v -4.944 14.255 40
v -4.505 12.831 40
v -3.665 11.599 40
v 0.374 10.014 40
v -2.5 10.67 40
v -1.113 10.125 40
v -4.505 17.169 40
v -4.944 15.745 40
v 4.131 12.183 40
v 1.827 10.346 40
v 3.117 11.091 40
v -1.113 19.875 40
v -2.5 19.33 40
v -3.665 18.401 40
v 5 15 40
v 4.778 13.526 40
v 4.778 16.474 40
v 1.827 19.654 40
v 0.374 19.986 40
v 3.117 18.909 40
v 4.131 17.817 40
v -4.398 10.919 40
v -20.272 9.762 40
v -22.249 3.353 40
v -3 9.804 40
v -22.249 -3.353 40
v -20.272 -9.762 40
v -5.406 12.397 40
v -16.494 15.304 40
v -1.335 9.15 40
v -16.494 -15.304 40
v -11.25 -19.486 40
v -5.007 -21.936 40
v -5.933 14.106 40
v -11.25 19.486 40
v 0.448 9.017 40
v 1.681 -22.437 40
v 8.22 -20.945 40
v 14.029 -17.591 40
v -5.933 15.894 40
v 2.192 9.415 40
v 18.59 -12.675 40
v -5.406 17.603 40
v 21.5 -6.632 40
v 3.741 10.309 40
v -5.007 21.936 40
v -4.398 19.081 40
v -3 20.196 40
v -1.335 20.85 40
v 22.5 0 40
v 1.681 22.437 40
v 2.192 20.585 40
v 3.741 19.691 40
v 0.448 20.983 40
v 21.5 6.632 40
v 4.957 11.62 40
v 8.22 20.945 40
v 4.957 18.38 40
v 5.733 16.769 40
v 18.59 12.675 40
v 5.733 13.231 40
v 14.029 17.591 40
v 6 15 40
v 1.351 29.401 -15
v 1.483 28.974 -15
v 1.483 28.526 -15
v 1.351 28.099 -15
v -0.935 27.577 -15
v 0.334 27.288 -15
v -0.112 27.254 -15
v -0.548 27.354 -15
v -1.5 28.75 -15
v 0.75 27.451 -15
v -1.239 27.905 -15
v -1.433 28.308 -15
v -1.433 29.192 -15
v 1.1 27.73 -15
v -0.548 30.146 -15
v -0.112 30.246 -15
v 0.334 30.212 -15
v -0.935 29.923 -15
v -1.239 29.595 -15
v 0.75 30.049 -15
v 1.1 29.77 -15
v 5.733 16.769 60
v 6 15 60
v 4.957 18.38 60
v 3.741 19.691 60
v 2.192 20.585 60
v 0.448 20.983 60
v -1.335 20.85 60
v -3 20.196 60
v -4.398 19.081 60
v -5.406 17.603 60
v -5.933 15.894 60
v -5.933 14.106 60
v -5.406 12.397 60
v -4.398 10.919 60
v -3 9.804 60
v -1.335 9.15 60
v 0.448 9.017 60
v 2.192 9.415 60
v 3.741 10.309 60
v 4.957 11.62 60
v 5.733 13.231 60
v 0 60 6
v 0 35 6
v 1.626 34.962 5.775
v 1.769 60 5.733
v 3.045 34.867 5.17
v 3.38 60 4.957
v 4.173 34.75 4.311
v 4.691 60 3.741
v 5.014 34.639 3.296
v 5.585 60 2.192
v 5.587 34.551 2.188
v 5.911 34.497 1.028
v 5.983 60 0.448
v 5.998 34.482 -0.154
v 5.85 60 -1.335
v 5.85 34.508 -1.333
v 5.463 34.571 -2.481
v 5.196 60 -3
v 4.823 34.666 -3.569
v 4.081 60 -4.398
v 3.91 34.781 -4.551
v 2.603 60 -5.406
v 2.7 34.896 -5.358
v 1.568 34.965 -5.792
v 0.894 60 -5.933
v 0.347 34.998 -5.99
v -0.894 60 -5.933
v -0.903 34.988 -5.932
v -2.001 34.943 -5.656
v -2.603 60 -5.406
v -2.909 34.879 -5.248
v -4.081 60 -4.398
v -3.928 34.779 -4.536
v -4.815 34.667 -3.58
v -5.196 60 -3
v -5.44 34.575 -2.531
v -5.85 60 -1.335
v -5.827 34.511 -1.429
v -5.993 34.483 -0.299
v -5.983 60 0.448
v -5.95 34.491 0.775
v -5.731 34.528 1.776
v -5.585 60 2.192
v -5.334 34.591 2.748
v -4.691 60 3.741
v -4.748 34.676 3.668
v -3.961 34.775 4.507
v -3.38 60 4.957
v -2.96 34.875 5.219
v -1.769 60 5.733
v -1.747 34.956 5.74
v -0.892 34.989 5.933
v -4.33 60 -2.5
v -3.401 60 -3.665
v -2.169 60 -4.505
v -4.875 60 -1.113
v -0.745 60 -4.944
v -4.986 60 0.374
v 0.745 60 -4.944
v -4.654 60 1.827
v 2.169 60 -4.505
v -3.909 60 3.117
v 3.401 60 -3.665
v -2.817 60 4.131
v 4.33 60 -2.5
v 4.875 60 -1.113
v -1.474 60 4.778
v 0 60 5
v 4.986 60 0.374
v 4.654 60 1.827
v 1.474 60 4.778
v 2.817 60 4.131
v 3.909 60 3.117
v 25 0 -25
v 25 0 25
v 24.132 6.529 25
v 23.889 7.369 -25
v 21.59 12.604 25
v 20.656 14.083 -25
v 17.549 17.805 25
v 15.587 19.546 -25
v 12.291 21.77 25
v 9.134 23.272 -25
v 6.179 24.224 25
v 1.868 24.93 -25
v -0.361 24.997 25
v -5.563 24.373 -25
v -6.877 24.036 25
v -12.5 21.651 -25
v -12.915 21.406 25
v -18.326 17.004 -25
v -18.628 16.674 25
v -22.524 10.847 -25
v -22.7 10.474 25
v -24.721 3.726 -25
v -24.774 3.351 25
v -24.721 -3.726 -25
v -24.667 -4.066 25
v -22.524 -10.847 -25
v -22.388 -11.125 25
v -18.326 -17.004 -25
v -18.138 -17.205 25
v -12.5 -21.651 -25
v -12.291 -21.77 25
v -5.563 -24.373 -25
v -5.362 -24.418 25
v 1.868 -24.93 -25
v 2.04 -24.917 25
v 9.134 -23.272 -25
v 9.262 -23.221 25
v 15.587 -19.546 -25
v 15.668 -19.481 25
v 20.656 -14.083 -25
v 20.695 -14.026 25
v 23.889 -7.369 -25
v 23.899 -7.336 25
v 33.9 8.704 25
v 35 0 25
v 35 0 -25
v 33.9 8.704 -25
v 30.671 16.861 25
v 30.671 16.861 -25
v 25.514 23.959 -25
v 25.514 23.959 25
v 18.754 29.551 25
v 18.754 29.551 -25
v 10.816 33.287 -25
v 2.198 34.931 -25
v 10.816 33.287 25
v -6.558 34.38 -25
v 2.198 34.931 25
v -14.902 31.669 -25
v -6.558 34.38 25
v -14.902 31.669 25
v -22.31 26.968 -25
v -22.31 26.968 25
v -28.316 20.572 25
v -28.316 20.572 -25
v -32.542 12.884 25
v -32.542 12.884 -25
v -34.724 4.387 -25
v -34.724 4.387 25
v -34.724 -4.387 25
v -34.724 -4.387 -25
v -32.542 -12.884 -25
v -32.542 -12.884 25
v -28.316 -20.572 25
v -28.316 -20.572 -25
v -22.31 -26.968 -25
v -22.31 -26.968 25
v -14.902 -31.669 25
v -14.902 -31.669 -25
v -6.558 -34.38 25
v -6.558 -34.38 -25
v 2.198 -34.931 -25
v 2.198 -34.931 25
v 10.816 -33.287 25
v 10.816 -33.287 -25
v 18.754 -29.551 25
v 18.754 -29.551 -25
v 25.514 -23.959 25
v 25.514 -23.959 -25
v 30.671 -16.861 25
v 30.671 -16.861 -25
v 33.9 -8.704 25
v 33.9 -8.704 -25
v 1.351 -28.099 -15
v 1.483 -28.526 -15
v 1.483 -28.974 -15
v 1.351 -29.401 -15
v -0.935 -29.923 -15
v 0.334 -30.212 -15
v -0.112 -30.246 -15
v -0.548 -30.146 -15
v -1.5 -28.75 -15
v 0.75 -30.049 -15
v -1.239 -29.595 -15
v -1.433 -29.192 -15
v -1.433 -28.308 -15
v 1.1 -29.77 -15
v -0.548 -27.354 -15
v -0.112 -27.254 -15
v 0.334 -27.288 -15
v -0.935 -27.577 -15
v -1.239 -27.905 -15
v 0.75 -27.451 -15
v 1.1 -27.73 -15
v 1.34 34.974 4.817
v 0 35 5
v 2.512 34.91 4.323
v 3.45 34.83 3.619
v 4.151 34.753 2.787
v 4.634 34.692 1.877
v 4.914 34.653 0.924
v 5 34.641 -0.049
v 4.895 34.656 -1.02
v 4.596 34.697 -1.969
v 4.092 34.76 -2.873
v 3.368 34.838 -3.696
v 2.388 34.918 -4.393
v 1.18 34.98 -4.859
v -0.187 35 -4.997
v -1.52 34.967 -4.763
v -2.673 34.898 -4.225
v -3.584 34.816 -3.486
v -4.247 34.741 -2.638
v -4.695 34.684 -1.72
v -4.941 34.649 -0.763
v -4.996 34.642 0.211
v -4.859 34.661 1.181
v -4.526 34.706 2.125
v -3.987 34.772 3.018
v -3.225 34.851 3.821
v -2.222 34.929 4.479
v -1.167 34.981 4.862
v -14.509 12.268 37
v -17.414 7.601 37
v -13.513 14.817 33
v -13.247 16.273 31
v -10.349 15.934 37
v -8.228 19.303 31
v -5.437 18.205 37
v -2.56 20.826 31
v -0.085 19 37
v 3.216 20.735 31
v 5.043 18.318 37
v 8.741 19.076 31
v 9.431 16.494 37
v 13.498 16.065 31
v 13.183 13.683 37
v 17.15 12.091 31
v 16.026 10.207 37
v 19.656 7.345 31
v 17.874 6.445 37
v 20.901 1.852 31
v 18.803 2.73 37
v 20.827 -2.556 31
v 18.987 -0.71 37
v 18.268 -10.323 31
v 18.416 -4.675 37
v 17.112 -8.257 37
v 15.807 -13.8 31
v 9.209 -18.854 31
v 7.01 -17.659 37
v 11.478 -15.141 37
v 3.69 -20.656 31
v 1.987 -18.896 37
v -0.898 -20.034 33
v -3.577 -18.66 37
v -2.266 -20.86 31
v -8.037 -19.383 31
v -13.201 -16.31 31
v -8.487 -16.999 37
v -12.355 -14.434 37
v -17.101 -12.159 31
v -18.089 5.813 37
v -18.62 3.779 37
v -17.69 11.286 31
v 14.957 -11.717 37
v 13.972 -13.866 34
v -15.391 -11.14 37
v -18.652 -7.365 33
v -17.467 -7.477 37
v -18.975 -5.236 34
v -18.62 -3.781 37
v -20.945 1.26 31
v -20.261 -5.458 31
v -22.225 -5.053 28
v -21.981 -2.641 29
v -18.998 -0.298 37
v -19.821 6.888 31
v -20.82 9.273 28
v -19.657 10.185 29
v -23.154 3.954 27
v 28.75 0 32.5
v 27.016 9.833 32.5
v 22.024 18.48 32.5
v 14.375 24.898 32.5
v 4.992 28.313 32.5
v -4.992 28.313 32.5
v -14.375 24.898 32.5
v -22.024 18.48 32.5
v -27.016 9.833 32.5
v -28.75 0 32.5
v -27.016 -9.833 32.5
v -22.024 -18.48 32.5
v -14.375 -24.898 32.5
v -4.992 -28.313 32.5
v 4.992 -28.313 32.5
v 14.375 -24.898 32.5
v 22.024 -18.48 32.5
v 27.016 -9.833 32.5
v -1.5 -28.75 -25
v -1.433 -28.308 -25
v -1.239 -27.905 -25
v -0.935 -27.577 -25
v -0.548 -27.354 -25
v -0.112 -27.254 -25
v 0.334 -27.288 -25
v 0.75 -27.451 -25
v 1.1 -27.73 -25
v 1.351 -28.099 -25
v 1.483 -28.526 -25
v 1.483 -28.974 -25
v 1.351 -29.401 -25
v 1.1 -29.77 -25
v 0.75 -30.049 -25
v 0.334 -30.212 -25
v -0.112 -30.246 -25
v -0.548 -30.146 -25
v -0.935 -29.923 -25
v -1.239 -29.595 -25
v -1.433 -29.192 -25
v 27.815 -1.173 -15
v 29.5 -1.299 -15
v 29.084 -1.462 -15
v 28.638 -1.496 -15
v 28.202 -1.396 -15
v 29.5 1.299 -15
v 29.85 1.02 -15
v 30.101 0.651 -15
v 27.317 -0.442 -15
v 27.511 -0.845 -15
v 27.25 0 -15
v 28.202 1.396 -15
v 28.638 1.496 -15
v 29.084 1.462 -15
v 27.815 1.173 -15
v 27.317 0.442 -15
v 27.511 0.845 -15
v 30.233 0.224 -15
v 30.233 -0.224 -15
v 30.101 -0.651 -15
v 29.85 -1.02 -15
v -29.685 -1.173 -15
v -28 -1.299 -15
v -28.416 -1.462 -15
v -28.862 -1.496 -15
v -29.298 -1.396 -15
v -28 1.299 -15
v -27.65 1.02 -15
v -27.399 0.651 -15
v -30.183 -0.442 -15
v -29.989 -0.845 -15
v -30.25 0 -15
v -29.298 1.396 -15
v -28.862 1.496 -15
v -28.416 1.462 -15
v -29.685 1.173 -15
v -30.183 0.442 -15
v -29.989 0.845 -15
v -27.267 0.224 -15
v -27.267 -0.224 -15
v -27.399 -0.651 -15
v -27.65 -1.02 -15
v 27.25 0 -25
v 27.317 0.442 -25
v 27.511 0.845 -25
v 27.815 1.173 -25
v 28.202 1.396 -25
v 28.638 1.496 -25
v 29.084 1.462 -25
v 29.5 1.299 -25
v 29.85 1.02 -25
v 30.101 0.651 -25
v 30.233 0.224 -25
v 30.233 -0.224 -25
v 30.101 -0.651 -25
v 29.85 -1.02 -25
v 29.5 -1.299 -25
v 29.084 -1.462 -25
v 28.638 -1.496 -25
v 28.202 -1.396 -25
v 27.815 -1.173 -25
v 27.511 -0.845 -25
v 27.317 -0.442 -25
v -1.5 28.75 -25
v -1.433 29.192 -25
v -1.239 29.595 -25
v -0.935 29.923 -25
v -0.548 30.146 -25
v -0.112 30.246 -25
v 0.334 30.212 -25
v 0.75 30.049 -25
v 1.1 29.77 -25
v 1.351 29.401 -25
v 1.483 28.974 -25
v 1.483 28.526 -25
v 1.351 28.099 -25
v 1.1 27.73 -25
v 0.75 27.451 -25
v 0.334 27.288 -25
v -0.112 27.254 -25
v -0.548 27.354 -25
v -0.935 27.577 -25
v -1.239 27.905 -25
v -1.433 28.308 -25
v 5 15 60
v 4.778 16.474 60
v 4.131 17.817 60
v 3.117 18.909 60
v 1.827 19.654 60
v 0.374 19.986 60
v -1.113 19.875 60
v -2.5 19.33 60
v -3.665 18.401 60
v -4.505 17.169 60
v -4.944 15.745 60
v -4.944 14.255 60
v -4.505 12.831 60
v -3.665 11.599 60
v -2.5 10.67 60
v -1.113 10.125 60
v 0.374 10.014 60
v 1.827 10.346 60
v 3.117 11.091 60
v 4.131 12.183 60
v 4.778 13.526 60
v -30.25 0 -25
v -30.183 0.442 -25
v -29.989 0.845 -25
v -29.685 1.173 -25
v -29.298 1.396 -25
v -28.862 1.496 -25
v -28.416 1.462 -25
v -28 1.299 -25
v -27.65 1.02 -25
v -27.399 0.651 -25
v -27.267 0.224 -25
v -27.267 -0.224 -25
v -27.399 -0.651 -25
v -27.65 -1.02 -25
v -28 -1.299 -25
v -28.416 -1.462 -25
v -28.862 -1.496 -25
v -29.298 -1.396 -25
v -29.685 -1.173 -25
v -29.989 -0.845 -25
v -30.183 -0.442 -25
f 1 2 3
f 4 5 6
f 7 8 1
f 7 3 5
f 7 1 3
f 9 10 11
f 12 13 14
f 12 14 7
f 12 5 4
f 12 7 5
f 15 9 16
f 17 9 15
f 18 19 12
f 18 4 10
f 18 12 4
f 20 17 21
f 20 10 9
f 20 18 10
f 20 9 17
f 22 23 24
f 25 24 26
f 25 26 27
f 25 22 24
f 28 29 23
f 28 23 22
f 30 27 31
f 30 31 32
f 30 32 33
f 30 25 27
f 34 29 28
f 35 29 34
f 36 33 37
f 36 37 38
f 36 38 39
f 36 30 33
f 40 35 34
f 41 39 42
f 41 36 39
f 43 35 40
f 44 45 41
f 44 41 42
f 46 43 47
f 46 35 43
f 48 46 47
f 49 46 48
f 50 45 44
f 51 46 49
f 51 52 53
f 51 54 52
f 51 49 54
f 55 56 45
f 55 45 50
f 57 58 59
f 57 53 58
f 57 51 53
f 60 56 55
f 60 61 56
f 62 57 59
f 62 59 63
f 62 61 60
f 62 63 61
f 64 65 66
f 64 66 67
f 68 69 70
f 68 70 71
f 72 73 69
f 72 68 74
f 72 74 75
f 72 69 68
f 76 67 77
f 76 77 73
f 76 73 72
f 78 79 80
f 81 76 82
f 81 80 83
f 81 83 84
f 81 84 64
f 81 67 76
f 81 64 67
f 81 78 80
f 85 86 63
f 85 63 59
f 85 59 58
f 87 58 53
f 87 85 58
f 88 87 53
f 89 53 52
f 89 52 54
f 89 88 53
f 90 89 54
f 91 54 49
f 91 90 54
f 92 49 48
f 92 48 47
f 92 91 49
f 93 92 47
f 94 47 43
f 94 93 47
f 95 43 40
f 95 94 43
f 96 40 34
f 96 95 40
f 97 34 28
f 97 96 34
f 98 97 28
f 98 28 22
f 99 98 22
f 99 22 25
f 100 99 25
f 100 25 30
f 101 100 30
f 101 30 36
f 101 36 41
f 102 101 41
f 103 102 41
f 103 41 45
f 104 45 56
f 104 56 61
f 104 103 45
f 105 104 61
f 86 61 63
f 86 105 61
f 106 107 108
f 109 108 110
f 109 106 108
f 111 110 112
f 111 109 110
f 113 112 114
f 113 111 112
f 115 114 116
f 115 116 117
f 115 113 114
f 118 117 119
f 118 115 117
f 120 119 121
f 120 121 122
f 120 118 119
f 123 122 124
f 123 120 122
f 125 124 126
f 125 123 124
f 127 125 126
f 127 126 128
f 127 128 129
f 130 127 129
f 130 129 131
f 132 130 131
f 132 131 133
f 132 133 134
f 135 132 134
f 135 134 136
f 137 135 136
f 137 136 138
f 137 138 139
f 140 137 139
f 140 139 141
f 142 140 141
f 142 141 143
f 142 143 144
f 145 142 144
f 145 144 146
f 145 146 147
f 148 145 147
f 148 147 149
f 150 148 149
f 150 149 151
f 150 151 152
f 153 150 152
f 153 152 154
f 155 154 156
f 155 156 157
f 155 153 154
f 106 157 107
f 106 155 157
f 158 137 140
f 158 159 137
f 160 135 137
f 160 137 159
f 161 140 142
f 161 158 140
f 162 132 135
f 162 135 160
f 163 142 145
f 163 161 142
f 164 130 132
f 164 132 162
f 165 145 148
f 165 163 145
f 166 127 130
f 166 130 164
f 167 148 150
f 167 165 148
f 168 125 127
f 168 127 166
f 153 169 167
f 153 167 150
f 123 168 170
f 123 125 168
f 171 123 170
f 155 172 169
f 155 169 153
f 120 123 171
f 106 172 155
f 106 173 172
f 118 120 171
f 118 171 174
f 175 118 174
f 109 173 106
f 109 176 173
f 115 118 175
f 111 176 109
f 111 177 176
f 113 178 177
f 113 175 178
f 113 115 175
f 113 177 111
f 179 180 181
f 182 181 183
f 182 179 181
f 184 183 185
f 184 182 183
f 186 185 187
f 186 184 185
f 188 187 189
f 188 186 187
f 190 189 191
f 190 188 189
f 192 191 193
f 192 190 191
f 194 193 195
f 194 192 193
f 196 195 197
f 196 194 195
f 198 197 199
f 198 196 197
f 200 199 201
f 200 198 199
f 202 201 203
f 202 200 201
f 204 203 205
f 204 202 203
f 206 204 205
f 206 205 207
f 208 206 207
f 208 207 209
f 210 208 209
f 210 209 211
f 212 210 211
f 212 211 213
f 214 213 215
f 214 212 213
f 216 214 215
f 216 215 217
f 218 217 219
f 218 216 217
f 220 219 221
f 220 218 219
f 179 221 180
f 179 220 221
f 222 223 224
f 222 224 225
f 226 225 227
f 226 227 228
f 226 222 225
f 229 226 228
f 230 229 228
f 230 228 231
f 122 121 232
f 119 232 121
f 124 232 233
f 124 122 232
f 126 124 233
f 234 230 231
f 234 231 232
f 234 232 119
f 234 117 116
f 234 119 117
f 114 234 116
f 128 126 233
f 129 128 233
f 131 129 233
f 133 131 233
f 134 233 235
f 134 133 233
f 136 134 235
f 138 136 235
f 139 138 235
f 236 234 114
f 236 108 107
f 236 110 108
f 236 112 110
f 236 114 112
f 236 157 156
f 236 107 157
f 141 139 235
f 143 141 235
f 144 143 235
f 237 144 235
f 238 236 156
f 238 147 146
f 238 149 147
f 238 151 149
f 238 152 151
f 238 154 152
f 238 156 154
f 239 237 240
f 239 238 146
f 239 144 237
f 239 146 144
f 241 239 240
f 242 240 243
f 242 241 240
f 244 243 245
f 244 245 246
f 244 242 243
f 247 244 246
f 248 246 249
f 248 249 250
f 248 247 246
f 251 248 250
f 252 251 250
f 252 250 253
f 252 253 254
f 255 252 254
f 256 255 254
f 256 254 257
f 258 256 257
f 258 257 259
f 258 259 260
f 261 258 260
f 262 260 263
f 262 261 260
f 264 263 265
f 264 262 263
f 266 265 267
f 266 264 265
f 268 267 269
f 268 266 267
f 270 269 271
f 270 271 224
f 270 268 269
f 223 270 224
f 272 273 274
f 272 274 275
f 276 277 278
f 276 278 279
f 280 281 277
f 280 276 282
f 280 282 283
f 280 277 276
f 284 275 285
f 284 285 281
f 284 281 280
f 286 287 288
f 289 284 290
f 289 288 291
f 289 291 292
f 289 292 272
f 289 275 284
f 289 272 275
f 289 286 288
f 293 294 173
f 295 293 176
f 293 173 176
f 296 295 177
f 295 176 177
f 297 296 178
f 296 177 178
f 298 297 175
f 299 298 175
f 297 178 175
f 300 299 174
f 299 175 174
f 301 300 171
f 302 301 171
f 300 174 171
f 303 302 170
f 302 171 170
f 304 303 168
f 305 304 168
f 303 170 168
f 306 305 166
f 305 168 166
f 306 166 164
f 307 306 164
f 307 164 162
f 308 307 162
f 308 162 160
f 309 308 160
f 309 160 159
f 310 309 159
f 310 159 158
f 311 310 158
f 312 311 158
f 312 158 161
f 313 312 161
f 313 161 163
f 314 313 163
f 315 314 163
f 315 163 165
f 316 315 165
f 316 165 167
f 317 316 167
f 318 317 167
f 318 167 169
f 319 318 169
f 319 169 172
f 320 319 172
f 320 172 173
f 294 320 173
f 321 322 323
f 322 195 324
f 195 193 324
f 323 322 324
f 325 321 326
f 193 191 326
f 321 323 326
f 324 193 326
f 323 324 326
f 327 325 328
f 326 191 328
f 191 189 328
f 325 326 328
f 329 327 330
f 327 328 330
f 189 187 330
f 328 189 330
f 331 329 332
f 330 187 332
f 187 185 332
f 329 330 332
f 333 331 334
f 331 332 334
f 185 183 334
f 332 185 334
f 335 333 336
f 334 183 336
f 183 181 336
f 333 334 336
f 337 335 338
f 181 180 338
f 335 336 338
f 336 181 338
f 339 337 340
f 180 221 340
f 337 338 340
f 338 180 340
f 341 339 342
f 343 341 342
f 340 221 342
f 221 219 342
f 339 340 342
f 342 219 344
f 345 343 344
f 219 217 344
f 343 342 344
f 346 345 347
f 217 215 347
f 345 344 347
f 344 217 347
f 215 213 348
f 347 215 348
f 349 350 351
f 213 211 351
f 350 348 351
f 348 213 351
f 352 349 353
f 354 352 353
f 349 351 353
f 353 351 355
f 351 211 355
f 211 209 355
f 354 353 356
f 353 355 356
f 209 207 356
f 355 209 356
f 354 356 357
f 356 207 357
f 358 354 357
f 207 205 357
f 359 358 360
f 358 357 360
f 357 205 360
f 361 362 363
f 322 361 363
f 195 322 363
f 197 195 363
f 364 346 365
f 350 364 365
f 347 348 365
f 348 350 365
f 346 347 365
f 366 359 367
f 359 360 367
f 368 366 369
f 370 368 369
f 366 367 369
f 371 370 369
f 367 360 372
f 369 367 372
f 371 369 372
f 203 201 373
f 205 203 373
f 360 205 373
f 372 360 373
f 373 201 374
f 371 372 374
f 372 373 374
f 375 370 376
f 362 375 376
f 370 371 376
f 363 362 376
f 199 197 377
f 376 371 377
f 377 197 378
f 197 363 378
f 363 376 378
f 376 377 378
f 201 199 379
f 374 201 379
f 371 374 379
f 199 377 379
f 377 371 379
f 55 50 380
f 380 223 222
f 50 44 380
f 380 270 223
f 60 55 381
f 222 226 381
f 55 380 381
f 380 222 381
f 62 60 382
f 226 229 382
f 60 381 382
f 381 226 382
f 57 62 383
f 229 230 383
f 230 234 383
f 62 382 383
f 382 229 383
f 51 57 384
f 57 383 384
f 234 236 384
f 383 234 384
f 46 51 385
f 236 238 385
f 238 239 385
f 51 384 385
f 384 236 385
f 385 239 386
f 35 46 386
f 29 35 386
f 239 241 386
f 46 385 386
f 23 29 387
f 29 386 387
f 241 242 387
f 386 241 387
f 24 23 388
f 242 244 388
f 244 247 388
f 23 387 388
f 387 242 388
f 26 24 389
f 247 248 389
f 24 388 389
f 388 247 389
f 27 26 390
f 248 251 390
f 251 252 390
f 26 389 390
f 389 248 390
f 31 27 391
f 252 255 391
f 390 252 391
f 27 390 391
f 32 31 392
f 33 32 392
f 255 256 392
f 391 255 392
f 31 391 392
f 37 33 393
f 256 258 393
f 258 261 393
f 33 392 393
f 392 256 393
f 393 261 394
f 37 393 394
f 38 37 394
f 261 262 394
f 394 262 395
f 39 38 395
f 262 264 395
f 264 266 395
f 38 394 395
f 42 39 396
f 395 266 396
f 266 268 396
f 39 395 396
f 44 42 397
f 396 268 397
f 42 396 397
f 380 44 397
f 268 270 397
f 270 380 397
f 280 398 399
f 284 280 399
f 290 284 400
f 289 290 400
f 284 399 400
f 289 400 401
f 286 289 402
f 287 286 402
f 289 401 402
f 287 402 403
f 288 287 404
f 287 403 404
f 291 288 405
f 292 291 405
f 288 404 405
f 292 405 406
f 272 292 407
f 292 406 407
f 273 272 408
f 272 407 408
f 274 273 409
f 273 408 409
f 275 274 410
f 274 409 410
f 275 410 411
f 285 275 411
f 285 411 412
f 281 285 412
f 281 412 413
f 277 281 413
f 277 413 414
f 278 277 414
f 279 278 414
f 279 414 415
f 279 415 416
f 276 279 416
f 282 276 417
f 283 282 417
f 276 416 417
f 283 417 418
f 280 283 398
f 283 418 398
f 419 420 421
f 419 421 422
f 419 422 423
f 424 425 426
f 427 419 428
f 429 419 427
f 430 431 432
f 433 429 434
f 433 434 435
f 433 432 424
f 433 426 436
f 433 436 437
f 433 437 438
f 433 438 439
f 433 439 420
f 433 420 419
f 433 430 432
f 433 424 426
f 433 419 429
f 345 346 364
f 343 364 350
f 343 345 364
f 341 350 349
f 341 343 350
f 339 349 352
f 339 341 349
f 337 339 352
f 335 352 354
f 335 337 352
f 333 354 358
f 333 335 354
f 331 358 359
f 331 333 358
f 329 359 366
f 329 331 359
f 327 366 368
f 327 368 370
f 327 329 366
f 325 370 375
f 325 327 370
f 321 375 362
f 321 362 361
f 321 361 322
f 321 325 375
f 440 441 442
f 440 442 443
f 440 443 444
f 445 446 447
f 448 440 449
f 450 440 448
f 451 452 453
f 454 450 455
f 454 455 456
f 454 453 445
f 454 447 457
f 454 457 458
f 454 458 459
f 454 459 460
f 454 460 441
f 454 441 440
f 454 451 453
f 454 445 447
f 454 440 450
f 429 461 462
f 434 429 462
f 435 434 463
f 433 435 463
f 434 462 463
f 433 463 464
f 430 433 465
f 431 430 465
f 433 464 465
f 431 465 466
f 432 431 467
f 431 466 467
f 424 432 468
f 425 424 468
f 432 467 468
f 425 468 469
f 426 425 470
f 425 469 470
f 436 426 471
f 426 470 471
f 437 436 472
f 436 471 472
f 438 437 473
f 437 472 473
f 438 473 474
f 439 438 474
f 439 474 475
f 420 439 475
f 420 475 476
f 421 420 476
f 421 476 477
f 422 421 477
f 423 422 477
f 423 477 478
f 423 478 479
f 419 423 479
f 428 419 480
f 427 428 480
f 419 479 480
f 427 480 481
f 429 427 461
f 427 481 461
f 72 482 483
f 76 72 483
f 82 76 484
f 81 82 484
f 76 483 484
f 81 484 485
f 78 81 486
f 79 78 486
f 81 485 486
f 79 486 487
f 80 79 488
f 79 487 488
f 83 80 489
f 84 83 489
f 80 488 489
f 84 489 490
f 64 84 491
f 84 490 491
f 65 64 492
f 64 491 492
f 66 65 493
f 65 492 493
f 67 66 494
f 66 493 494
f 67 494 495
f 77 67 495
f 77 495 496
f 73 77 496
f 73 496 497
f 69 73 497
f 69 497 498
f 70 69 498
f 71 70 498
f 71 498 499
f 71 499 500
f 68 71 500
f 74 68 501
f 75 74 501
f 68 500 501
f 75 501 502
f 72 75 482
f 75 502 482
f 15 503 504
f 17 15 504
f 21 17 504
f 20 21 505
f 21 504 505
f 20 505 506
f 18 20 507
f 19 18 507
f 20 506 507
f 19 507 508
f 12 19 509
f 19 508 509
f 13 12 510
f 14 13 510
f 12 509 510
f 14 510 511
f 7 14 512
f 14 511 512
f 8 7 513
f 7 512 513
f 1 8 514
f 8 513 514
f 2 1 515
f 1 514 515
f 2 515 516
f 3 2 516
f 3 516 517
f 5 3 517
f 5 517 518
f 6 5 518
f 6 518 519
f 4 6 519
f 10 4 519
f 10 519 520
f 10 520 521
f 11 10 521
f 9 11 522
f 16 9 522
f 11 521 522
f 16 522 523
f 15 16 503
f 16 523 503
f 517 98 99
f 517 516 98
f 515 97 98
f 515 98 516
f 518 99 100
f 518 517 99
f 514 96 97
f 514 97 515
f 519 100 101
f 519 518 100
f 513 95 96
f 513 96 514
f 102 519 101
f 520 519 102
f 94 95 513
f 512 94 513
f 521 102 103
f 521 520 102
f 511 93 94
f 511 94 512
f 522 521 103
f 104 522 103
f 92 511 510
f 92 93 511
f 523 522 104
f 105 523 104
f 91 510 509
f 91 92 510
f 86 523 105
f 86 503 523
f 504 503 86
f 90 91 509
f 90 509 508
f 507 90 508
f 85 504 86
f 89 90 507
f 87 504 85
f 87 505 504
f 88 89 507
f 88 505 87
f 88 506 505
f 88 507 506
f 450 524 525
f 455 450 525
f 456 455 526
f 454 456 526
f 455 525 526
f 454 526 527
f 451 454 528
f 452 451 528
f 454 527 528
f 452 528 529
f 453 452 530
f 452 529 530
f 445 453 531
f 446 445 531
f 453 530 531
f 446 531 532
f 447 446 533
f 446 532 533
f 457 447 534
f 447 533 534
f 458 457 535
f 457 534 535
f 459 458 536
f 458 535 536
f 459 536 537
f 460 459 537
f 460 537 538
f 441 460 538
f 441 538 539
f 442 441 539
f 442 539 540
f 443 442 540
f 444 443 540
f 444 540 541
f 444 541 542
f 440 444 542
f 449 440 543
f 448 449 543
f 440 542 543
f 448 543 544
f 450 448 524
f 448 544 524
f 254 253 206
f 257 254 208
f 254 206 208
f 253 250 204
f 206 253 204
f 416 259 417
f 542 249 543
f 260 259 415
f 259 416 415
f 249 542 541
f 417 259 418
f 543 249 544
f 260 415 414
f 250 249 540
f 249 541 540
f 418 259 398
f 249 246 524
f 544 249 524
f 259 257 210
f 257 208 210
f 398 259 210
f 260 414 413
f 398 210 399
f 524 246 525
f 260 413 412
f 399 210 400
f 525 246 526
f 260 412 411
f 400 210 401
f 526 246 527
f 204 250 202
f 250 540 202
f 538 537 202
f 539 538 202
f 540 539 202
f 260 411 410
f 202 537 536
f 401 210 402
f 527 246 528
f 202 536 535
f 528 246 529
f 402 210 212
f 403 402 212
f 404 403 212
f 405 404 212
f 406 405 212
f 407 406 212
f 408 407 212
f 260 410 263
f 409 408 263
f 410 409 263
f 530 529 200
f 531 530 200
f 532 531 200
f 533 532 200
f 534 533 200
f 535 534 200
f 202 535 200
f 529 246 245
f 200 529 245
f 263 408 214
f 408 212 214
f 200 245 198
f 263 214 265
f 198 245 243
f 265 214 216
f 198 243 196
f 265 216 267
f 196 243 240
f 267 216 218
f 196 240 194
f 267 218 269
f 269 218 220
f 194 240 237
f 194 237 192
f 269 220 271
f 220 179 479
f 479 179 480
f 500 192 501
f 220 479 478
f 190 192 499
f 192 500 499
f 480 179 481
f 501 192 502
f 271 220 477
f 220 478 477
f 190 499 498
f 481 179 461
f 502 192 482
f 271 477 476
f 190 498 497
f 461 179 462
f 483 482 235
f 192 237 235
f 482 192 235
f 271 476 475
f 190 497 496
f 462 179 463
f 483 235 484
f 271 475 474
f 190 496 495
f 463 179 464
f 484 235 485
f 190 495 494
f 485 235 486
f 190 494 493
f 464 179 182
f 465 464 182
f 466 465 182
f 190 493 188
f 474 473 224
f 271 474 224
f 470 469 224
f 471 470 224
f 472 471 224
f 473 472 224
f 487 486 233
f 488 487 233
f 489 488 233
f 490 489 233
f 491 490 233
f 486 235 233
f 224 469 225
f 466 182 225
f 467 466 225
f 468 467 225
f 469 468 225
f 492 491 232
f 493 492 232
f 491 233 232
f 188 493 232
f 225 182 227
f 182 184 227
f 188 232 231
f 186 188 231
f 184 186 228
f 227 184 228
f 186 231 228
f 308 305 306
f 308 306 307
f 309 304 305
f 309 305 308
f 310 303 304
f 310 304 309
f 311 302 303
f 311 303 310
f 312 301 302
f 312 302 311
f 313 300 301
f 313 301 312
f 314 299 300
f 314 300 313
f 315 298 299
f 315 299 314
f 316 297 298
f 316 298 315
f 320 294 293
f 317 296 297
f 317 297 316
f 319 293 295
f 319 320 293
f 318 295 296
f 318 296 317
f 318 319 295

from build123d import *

# Parameters (mm, degrees)
SKETCH_1_R           = 35
SKETCH_1_R_2         = 25
EXTRUDE_1_DEPTH      = 25
SKETCH_2_R           = 1.5
CUT_EXTRUDE_1_DEPTH  = 10
SKETCH_4_R           = 22.5
SKETCH_3_R           = 35
EXTRUDE_2_REACH      = 110.858
EXTRUDE_2_END_RADIUS = 35
SKETCH_7_R           = 6
SKETCH_7_R_2         = 5
SKETCH_9_R           = 6
SKETCH_9_R_2         = 5
EXTRUDE_3_DEPTH      = 20


with BuildPart() as part:
    # 草图1 → 凸台-拉伸1 (new, symmetric)
    with BuildSketch(Plane.XY):
        Circle(SKETCH_1_R)
        Circle(SKETCH_1_R_2, mode=Mode.SUBTRACT)
    extrude(amount=EXTRUDE_1_DEPTH, both=True)

    # 草图2 → 切除-拉伸1 (cut)
    with BuildSketch(Plane(origin=(0, 0, -25), x_dir=(-1, 0, 0), z_dir=(0, 0, -1))):
        with Locations((0, 28.75)):
            Circle(SKETCH_2_R)
        with Locations((28.75, 0)):
            Circle(SKETCH_2_R)
        with Locations((0, -28.75)):
            Circle(SKETCH_2_R)
        with Locations((-28.75, 0)):
            Circle(SKETCH_2_R)
    extrude(amount=-CUT_EXTRUDE_1_DEPTH, mode=Mode.SUBTRACT)

    # 草图4 → Loft 1 section 0
    with BuildSketch(Plane.XY.offset(40)):
        Circle(SKETCH_4_R)
    # 草图3 → Loft 1 section 1
    with BuildSketch(Plane.XY.offset(25)):
        Circle(SKETCH_3_R)
    loft()

    # Loft 1 2: read off the stored shape, not the designer's step
    # Loft 1 2: loft between two sections, ruled curve by curve
    loft_1_2_from = [
        Edge.make_bspline([(-17.413546016, 7.600553608, 37), (-2.212438801, 42.42764564, 37), (32.614653231, 27.226538425, 37), (17.413546016, -7.600553608, 37), (2.212438801, -42.42764564, 37), (-32.614653231, -27.226538425, 37), (-17.413546016, 7.600553608, 37)], [0, 0, 0, 0, 0.5, 0.5, 0.5, 1, 1, 1, 1], 3, [1, 0.333333333, 0.333333333, 1, 0.333333333, 0.333333333, 1]),
    ]
    loft_1_2_to = [
        Edge.make_bspline([(-12.914827658, 21.405775542, 25), (29.896723426, 47.235430858, 25), (55.726378742, 4.423879774, 25), (12.914827658, -21.405775542, 25), (-29.896723426, -47.235430858, 25), (-55.726378742, -4.423879774, 25), (-12.914827658, 21.405775542, 25)], [0, 0, 0, 0, 0.5, 0.5, 0.5, 1, 1, 1, 1], 3, [1, 0.333333333, 0.333333333, 1, 0.333333333, 0.333333333, 1]),
    ]
    loft_1_2 = Solid(Shell([*[Face.make_surface_from_curves(loft_1_2_from[k], loft_1_2_to[k]) for k in range(1)], Face(Wire(loft_1_2_from)), Face(Wire(loft_1_2_to))]))
    add(loft_1_2, mode=Mode.SUBTRACT)

    # 凸台-拉伸2: up to this cylinder (the profile starts outside it)
    extrude_2_end = Plane(origin=(0, 0, -5.830294), z_dir=(0, 0, -1)) * Cylinder(EXTRUDE_2_END_RADIUS, 292.716, mode=Mode.PRIVATE)
    # 草图7 → 凸台-拉伸2 (add, up to the surface)
    with BuildSketch(Plane(origin=(0, 60, 0), x_dir=(1, 0, 0), z_dir=(0, 1, 0)), mode=Mode.PRIVATE) as extrude_2_sk1:
        with Locations(Location((0, 0, 0), (0, 0, 270))):
            Circle(SKETCH_7_R)
        with Locations(Location((0, 0, 0), (0, 0, 270))):
            Circle(SKETCH_7_R_2, mode=Mode.SUBTRACT)
    extrude_2_tool1 = extrude(extrude_2_sk1.sketch, amount=-EXTRUDE_2_REACH, mode=Mode.PRIVATE) - extrude_2_end
    add(extrude_2_tool1.solids().sort_by_distance((0, 60, -5.830294))[0])

    # 草图9 → 凸台-拉伸3 (add)
    with BuildSketch(Plane.XY.offset(60)):
        with Locations((0, 15)):
            Circle(SKETCH_9_R)
        with Locations((0, 15)):
            Circle(SKETCH_9_R_2, mode=Mode.SUBTRACT)
    extrude(amount=-EXTRUDE_3_DEPTH)


solid = part.part
